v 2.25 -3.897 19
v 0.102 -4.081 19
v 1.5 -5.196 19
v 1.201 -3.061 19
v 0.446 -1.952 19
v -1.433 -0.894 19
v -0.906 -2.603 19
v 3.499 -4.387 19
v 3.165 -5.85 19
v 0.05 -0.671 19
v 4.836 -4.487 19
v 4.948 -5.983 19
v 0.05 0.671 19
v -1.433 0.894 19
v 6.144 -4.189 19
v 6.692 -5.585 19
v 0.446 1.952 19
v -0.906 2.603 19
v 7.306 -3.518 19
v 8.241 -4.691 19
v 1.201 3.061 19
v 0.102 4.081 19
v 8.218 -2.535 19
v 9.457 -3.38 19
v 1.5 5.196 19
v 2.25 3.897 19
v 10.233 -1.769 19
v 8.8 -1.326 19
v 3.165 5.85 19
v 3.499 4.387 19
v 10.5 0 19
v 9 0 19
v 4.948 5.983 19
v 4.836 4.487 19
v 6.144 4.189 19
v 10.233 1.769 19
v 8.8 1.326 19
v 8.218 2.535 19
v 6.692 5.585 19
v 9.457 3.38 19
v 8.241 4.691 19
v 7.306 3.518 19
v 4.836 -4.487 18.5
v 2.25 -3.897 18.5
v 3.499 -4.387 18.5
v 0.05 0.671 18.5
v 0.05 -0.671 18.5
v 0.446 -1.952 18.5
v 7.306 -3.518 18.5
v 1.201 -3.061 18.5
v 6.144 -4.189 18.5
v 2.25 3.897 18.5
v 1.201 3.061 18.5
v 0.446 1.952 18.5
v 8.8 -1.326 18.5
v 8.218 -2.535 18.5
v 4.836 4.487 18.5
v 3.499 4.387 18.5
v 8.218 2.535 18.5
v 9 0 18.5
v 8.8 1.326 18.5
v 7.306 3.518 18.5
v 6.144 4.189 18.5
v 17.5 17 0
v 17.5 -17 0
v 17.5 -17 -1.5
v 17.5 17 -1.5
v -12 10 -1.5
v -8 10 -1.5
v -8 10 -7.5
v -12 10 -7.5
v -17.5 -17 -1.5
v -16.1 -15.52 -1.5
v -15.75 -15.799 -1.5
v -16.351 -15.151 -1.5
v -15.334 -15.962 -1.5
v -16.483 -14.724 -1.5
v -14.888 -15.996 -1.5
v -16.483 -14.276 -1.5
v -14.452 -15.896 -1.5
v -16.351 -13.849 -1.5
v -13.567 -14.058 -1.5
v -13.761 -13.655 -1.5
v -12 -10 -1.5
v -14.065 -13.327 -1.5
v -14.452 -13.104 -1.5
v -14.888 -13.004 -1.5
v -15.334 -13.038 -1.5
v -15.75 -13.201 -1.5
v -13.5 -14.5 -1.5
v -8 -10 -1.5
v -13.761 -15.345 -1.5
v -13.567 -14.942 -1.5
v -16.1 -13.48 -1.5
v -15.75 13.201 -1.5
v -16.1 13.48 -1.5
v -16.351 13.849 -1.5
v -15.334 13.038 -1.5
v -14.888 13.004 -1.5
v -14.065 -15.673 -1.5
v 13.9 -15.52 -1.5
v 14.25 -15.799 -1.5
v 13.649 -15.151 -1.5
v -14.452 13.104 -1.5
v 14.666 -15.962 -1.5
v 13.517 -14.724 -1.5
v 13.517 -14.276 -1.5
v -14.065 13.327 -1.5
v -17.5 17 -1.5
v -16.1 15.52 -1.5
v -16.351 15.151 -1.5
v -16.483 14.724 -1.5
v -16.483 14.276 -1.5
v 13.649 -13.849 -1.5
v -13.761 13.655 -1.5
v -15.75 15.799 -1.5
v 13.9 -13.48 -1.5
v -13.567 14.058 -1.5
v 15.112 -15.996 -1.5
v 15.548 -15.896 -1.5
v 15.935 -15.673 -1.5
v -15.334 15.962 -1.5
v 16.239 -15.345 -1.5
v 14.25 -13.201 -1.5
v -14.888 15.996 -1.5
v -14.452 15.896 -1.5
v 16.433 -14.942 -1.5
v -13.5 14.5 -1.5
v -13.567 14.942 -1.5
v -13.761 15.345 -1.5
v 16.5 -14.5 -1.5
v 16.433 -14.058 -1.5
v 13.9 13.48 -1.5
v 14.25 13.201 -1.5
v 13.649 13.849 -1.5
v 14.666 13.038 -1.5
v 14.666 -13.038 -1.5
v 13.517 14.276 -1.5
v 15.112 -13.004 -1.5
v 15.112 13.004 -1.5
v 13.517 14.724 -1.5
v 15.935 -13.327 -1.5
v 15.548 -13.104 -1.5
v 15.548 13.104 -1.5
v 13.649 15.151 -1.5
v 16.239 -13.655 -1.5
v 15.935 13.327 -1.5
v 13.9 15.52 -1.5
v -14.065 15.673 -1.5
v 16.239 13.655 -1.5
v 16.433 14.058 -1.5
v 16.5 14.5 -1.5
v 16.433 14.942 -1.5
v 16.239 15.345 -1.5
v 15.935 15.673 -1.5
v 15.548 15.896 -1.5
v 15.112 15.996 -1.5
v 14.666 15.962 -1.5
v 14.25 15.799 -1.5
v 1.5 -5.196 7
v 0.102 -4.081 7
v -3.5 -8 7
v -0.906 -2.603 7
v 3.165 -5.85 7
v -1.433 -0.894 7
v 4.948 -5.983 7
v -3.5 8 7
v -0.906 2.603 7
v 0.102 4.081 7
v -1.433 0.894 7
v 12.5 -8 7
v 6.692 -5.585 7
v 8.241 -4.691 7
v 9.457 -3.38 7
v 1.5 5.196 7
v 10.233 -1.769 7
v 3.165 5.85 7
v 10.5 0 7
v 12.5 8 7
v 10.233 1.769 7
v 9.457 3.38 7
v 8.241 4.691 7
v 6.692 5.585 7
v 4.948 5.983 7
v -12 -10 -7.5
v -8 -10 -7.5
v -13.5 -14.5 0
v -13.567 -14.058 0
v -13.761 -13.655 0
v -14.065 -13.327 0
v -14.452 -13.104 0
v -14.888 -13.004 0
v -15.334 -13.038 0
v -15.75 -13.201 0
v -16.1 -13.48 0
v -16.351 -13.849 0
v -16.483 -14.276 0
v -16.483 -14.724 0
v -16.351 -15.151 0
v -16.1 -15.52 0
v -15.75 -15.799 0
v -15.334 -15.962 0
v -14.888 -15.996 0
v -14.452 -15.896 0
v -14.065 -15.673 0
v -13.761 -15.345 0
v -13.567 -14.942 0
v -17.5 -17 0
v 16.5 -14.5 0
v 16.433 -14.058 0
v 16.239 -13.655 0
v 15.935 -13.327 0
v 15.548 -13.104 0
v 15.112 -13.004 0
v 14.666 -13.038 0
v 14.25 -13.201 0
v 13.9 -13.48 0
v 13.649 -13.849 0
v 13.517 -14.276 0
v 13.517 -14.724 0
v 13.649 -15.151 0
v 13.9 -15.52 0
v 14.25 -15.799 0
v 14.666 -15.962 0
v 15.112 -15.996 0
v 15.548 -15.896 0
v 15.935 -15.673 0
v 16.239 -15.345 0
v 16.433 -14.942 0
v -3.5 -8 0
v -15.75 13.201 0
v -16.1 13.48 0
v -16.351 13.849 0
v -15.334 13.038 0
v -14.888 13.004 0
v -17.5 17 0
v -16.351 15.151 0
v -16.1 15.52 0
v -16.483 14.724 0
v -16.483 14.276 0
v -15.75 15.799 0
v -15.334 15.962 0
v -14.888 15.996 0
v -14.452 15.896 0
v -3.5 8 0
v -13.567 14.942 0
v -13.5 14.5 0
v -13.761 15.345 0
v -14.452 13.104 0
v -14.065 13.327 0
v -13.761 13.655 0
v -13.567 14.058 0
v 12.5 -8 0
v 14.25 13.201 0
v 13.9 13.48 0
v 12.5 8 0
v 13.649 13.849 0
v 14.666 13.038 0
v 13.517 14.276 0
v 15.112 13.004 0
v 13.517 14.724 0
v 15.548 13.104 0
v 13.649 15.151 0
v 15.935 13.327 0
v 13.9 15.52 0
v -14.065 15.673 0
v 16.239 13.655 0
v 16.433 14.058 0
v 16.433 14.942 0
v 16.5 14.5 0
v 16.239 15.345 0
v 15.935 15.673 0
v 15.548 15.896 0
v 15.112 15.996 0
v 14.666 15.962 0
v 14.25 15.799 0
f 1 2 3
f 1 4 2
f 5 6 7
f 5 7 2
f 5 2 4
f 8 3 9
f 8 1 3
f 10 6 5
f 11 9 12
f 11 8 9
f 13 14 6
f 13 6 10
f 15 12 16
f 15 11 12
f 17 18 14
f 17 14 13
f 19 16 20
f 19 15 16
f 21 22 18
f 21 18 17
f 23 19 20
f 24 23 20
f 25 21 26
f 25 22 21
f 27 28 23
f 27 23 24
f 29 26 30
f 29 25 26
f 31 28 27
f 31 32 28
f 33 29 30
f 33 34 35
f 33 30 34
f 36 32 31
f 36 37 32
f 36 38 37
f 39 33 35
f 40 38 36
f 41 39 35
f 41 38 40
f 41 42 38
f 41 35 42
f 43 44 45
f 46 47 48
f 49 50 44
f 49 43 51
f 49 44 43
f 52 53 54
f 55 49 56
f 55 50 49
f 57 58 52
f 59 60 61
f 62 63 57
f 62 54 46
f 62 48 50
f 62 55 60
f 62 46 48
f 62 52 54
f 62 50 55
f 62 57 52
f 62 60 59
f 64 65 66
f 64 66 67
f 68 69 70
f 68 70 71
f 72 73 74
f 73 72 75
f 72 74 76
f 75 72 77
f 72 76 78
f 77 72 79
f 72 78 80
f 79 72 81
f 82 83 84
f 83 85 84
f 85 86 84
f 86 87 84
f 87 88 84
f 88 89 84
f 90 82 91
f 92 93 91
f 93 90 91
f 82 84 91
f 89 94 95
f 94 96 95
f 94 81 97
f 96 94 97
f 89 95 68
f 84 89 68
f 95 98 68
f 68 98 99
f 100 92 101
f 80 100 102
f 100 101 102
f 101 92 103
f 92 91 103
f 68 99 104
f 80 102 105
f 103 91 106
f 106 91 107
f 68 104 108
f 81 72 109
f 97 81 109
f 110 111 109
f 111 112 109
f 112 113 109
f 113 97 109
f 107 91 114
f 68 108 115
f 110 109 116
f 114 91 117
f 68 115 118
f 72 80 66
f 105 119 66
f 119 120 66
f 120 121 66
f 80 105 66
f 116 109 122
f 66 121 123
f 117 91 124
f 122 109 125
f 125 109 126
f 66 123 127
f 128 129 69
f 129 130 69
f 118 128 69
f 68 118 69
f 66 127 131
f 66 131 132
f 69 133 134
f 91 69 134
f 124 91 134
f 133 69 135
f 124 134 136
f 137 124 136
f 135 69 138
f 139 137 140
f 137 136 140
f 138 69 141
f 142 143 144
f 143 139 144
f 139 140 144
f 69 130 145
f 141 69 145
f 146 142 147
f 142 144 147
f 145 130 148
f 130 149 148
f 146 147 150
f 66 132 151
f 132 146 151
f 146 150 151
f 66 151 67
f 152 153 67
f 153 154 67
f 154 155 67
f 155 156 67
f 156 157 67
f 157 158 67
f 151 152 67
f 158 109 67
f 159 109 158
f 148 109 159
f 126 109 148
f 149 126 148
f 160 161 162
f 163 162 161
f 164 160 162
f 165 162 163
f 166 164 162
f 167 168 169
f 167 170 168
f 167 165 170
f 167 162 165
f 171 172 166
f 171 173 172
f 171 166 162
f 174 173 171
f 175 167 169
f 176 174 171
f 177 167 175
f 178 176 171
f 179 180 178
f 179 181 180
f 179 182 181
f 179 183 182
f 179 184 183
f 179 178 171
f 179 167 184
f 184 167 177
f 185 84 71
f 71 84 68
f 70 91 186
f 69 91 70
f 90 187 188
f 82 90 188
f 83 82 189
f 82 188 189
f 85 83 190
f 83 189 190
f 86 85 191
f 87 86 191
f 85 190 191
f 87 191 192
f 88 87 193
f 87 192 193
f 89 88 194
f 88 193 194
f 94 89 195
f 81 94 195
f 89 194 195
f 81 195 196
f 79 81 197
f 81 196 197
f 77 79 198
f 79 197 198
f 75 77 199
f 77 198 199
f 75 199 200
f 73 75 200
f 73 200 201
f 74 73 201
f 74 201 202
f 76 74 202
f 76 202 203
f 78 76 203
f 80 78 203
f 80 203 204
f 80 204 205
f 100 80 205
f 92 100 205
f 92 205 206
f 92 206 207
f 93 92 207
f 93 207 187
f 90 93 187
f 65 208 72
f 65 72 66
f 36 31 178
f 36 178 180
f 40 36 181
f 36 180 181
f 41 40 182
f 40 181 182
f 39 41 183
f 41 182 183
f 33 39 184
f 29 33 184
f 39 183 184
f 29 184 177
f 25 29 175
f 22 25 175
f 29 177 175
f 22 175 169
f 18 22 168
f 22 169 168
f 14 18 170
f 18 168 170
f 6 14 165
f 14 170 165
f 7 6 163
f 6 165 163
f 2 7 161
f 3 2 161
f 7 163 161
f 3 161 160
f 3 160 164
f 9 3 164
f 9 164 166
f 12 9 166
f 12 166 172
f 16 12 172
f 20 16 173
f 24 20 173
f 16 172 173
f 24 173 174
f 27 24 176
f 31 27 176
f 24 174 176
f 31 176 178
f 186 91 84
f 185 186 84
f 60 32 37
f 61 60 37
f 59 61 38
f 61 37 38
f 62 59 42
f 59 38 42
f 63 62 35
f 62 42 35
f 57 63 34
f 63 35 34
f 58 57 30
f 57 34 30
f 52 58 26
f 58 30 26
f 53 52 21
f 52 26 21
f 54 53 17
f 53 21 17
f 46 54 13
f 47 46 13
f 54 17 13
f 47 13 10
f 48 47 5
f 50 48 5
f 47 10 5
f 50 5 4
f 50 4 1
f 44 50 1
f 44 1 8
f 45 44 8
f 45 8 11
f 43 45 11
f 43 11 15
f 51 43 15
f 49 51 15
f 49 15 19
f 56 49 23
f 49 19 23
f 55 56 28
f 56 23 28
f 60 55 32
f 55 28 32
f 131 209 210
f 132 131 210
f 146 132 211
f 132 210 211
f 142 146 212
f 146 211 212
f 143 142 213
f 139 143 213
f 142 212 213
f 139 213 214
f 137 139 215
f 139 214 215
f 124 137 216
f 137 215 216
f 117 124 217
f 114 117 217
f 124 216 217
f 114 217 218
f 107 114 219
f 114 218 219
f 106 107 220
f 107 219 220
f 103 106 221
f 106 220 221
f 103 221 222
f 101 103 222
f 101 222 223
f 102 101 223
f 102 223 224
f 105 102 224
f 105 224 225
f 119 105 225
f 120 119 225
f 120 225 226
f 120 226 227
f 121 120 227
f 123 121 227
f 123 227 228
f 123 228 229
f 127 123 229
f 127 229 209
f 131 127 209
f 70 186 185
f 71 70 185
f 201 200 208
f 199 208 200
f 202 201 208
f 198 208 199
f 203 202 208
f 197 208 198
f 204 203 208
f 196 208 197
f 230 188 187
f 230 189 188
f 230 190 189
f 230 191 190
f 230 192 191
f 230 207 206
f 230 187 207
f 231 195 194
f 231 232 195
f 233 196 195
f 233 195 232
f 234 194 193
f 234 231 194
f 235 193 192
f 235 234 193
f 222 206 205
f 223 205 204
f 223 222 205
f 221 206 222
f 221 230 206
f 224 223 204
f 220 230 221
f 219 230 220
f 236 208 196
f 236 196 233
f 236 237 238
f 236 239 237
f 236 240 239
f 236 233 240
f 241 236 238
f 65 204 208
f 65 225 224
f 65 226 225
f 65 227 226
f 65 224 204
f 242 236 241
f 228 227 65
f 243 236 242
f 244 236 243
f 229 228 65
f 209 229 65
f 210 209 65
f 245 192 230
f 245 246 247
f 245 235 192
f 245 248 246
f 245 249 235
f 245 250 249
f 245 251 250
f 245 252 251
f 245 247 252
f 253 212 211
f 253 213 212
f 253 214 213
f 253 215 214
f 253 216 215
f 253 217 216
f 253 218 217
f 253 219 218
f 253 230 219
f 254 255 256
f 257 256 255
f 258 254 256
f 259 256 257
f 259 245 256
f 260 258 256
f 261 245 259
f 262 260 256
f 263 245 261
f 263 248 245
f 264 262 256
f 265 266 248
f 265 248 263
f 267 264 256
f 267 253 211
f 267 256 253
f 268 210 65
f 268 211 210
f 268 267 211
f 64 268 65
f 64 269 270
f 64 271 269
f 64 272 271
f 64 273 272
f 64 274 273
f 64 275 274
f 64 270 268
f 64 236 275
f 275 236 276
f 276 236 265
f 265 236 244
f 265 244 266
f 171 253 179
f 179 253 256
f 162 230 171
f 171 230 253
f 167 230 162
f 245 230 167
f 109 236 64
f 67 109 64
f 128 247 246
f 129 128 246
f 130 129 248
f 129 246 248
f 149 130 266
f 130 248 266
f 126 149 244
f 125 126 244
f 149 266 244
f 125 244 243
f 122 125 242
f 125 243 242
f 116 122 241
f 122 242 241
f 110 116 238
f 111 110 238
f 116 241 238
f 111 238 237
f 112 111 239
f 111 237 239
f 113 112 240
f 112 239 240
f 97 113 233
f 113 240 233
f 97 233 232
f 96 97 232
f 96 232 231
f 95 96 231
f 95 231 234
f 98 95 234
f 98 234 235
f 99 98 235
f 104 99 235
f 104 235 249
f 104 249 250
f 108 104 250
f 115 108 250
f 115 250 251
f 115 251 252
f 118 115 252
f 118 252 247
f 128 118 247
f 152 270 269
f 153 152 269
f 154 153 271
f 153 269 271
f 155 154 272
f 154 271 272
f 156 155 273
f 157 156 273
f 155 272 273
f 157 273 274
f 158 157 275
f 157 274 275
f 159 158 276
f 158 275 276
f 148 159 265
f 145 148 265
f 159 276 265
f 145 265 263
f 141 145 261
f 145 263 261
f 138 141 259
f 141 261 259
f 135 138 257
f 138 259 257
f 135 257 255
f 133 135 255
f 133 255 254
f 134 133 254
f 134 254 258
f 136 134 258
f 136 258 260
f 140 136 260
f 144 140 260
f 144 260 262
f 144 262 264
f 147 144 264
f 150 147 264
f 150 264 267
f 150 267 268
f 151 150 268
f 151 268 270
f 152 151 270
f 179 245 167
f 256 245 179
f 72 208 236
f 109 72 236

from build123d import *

# Parameters (mm, degrees)
SKETCH1_W           = 35
SKETCH1_H           = 34
BOSS_EXTRUDE1_DEPTH = 1.5
CUT_EXTRUDE1_REACH  = 3.5
SKETCH2_R           = 1.5
SKETCH3_W           = 16
SKETCH3_H           = 16
BOSS_EXTRUDE3_DEPTH = 7
SKETCH4_R           = 6
BOSS_EXTRUDE4_DEPTH = 12
SKETCH7_R           = 4.5
CUT_EXTRUDE2_DEPTH  = 0.5
SKETCH8_W           = 4
SKETCH8_H           = 20
BOSS_EXTRUDE5_DEPTH = 6


with BuildPart() as part:
    # Sketch1 → Boss-Extrude1 (new body)
    with BuildSketch(Plane.XY):
        Rectangle(SKETCH1_W, SKETCH1_H)
    extrude(amount=-BOSS_EXTRUDE1_DEPTH)

    # Sketch2 → Cut-Extrude1 (cut, up to next)
    with BuildSketch(Plane.XY, mode=Mode.PRIVATE) as cut_extrude1_sk1:
        with Locations((-15, -14.5)):
            Circle(SKETCH2_R)
    cut_extrude1_tool1 = extrude(cut_extrude1_sk1.sketch, amount=-CUT_EXTRUDE1_REACH, mode=Mode.PRIVATE) & part.part
    add(cut_extrude1_tool1.solids().sort_by_distance((-15, -14.5, 0))[0], mode=Mode.SUBTRACT)
    # Sketch2 → Cut-Extrude1 (cut, up to next)
    with BuildSketch(Plane.XY, mode=Mode.PRIVATE) as cut_extrude1_sk2:
        with Locations((15, -14.5)):
            Circle(SKETCH2_R)
    cut_extrude1_tool2 = extrude(cut_extrude1_sk2.sketch, amount=-CUT_EXTRUDE1_REACH, mode=Mode.PRIVATE) & part.part
    add(cut_extrude1_tool2.solids().sort_by_distance((15, -14.5, 0))[0], mode=Mode.SUBTRACT)
    # Sketch2 → Cut-Extrude1 (cut, up to next)
    with BuildSketch(Plane.XY, mode=Mode.PRIVATE) as cut_extrude1_sk3:
        with Locations((15, 14.5)):
            Circle(SKETCH2_R)
    cut_extrude1_tool3 = extrude(cut_extrude1_sk3.sketch, amount=-CUT_EXTRUDE1_REACH, mode=Mode.PRIVATE) & part.part
    add(cut_extrude1_tool3.solids().sort_by_distance((15, 14.5, 0))[0], mode=Mode.SUBTRACT)
    # Sketch2 → Cut-Extrude1 (cut, up to next)
    with BuildSketch(Plane.XY, mode=Mode.PRIVATE) as cut_extrude1_sk4:
        with Locations((-15, 14.5)):
            Circle(SKETCH2_R)
    cut_extrude1_tool4 = extrude(cut_extrude1_sk4.sketch, amount=-CUT_EXTRUDE1_REACH, mode=Mode.PRIVATE) & part.part
    add(cut_extrude1_tool4.solids().sort_by_distance((-15, 14.5, 0))[0], mode=Mode.SUBTRACT)

    # Sketch3 → Boss-Extrude3 (add)
    with BuildSketch(Plane.XY):
        with Locations((4.5, 0)):
            Rectangle(SKETCH3_W, SKETCH3_H)
    extrude(amount=BOSS_EXTRUDE3_DEPTH)

    # Sketch4 → Boss-Extrude4 (add)
    with BuildSketch(Plane.XY.offset(7)):
        with Locations((4.5, 0)):
            Circle(SKETCH4_R)
    extrude(amount=BOSS_EXTRUDE4_DEPTH)

    # Sketch7 → Cut-Extrude2 (cut)
    with BuildSketch(Plane.XY.offset(19)):
        with Locations((4.5, 0)):
            Circle(SKETCH7_R)
    extrude(amount=-CUT_EXTRUDE2_DEPTH, mode=Mode.SUBTRACT)

    # Sketch8 → Boss-Extrude5 (add)
    with BuildSketch(Plane(origin=(0, 0, -1.5), x_dir=(-1, 0, 0), z_dir=(0, 0, -1))):
        with Locations((10, 0)):
            Rectangle(SKETCH8_W, SKETCH8_H)
    extrude(amount=BOSS_EXTRUDE5_DEPTH)


solid = part.part
